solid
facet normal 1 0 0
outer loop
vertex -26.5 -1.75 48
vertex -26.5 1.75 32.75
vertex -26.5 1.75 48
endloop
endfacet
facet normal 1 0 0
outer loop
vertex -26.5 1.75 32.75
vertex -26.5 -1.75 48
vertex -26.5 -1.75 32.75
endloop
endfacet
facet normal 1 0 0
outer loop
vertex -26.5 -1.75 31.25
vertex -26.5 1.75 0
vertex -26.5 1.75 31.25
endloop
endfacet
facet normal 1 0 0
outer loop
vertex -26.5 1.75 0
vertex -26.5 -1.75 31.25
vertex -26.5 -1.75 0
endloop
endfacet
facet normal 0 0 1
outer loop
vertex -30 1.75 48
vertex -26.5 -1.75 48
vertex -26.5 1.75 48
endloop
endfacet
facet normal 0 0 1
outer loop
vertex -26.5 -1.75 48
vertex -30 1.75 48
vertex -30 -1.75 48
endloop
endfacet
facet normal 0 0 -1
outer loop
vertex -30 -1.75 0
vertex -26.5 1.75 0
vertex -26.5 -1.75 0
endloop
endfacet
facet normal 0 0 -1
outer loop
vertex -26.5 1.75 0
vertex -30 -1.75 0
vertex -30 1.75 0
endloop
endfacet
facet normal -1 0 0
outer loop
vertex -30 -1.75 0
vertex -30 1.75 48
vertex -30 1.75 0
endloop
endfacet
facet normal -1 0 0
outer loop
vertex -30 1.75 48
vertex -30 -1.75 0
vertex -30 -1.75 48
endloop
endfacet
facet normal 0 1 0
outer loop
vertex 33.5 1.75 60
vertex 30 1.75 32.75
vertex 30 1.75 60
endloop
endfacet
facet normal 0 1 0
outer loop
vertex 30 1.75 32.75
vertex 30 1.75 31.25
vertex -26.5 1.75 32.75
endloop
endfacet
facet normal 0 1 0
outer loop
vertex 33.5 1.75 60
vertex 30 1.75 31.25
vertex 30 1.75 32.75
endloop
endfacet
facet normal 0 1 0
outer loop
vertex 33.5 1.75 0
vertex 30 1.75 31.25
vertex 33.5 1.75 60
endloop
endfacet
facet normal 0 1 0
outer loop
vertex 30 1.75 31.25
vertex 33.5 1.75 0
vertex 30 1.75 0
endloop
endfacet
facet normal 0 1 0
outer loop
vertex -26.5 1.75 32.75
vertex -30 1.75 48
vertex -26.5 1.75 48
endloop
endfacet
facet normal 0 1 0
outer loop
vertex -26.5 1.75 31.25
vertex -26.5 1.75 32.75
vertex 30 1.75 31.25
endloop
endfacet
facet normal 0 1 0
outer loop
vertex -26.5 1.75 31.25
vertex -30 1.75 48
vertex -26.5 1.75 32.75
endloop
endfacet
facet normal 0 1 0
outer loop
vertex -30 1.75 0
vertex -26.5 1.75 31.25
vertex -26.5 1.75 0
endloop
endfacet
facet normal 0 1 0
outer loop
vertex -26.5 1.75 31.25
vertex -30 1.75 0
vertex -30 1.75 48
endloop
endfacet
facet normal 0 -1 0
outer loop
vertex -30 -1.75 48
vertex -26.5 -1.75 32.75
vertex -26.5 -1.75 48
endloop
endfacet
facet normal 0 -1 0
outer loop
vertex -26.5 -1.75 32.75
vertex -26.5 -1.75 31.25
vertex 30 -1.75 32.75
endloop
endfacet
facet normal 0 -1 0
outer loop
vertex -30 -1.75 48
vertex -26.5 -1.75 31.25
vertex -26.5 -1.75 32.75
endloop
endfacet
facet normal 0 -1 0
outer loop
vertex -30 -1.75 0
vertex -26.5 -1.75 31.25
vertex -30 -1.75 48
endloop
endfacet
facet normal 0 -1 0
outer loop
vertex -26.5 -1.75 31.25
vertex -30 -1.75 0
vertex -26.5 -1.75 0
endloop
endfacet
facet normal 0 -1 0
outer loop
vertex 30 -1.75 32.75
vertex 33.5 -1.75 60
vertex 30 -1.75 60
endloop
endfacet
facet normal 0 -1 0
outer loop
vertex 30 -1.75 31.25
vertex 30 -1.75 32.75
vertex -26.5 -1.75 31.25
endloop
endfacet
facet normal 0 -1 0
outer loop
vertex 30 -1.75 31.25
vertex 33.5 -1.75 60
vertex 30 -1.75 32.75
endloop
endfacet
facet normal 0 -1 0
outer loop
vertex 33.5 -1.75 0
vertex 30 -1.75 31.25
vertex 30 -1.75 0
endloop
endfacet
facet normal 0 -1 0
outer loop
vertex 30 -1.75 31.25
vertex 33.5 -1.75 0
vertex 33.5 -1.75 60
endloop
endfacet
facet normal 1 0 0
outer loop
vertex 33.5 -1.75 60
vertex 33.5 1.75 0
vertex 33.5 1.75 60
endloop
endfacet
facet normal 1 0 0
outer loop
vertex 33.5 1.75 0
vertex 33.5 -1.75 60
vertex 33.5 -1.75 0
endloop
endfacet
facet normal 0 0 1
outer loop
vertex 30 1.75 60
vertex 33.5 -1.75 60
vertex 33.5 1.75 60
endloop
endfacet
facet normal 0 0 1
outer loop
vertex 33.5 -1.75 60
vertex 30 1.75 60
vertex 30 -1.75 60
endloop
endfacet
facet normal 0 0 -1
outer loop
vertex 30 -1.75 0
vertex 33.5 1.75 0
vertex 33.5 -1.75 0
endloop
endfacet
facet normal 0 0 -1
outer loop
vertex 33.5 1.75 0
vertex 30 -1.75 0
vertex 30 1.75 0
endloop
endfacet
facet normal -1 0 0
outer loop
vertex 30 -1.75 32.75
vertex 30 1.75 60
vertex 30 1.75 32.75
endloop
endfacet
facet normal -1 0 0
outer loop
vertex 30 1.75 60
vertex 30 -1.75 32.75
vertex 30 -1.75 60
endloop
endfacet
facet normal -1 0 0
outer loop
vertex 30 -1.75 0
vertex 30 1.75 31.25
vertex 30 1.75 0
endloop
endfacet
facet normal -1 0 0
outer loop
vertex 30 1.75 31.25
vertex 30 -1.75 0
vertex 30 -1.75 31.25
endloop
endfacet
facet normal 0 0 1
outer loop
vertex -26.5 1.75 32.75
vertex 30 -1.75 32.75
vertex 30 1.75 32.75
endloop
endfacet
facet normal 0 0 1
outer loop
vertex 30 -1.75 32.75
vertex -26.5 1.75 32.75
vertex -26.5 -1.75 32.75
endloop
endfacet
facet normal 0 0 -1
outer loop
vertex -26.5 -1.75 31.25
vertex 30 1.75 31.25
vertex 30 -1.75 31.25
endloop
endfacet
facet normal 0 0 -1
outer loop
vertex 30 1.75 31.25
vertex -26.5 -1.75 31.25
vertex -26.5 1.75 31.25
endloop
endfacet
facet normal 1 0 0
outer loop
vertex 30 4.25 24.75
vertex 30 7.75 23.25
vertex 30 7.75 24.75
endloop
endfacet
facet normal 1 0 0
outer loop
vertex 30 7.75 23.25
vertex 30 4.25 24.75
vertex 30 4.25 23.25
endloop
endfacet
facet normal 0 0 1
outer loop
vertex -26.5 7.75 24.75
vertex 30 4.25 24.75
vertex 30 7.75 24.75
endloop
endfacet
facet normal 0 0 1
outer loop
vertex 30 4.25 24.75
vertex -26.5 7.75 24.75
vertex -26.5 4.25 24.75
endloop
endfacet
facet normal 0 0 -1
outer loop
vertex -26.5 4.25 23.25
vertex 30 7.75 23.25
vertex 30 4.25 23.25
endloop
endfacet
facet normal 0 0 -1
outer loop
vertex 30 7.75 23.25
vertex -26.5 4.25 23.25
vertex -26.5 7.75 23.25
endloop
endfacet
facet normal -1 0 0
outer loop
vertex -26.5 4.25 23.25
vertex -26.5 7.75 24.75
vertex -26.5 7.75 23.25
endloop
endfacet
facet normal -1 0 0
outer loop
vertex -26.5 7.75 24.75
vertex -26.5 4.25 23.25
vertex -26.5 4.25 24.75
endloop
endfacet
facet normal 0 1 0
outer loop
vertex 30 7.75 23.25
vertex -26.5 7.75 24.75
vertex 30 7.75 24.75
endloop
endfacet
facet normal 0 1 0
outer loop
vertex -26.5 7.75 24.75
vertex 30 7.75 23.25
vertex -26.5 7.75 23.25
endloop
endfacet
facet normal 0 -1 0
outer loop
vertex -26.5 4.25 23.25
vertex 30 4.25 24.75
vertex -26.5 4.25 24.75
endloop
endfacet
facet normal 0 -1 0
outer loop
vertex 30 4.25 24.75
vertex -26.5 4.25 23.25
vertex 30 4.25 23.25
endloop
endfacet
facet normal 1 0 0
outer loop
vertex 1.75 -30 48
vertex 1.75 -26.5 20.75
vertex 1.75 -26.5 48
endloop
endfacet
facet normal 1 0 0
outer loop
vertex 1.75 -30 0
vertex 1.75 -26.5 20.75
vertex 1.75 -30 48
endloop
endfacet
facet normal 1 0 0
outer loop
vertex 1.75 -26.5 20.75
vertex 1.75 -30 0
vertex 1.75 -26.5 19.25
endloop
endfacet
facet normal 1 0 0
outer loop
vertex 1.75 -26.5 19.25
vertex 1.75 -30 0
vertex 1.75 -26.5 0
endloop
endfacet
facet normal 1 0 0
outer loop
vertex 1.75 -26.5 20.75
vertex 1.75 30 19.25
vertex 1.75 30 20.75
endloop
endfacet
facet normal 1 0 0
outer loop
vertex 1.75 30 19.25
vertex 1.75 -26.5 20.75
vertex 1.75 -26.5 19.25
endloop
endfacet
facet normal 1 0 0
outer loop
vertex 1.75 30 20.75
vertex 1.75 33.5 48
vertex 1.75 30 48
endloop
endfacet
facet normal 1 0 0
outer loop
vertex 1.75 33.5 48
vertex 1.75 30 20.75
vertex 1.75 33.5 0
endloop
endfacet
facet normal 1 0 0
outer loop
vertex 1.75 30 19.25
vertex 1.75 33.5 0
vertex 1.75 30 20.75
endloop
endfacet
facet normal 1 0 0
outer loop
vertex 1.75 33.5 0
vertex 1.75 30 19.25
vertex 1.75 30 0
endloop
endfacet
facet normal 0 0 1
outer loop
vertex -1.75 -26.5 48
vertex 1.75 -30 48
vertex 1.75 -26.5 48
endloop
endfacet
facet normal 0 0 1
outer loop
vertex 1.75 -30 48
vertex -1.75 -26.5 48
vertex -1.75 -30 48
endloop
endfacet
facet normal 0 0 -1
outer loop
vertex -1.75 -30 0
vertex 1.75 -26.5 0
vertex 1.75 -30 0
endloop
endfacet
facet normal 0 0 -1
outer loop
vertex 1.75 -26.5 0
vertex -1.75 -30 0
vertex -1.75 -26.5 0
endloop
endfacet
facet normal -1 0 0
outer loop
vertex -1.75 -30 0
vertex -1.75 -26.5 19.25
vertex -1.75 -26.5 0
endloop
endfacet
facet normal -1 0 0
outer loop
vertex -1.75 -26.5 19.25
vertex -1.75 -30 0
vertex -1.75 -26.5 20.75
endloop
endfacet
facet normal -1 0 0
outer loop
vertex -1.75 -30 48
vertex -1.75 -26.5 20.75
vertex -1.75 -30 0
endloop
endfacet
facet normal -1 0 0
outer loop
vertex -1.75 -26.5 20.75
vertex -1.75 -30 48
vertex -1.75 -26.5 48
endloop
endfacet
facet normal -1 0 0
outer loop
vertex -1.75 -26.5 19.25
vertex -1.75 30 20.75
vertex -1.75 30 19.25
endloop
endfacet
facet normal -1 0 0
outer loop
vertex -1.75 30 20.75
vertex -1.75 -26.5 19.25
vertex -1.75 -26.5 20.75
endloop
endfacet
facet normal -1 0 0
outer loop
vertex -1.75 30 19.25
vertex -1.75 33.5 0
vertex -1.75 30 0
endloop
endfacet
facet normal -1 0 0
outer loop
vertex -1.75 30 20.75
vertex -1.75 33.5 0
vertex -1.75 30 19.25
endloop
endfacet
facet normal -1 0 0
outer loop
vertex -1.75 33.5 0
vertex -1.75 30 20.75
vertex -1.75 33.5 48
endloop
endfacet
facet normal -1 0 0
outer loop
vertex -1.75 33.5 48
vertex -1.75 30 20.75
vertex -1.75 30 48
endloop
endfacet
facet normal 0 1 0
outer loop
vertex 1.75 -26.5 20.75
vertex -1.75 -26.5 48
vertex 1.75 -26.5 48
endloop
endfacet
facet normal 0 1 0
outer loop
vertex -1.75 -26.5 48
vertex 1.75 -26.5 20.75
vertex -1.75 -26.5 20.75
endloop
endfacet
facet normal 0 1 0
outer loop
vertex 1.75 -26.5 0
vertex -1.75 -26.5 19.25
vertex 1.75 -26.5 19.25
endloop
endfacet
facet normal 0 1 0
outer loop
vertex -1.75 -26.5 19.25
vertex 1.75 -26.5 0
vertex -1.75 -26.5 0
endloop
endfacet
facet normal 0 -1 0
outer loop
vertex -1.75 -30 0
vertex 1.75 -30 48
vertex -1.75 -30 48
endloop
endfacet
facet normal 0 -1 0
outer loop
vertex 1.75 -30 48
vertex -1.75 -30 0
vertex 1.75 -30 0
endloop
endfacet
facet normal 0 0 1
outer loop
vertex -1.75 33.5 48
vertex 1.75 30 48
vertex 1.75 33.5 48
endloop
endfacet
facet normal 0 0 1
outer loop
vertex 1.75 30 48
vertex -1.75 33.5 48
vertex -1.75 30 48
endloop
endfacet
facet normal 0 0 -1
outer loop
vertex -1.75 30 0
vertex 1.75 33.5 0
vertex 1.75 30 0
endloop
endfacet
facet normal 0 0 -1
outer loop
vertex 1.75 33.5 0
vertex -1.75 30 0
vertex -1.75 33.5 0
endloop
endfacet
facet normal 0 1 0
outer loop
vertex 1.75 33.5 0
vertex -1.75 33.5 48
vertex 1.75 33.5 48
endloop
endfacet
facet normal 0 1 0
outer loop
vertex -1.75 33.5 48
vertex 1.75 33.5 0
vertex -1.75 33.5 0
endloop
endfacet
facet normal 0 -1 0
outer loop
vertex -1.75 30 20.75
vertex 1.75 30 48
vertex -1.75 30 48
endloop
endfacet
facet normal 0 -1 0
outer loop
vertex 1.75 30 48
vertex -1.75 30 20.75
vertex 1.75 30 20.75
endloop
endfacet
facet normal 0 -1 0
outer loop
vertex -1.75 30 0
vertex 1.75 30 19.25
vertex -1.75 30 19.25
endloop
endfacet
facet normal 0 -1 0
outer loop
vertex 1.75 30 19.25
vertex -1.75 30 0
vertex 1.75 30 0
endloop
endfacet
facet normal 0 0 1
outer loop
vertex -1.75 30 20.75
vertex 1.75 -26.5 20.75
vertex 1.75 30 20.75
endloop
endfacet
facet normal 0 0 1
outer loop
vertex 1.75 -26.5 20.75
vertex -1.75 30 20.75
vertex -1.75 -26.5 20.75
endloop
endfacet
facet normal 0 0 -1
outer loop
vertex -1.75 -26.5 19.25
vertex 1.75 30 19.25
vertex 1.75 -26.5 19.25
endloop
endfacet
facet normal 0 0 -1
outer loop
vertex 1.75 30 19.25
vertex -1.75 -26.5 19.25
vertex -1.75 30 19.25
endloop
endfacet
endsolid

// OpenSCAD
/*
  Parametric lumber assembly
  Units: inches

  Supports and rails are represented as data records.
  Rendering is separate from geometry definition.

  Actual lumber dimensions:
    2x4 = 1.5 x 3.5
    4x4 = 3.5 x 3.5

  Lumber record format:
    [
      name,      // string, e.g. "left_post"
      type,      // "2x4", "4x4"
      axis,      // "x", "y", or "z"
      start,     // [x, y, z] minimum corner
      length,    // length along axis
      rotated    // bool; rotates cross-section 90 degrees
    ]

  Default orientation:
    X-running 2x4 -> [length, 3.5, 1.5]
    Y-running 2x4 -> [3.5, length, 1.5]
    Z-running 2x4 -> [3.5, 1.5, length]

  Set rotated = false to use the alternate orientation:
    X-running 2x4 -> [length, 1.5, 3.5]
    Y-running 2x4 -> [1.5, length, 3.5]
    Z-running 2x4 -> [1.5, 3.5, length]

  BOM output:
    Call bom_lumber(piece) or bom_lumber_list(pieces).
    Output appears in the OpenSCAD console as ECHO lines.
*/

$fn = 48;


// ------------------------------------------------------------
// Vector helpers
// ------------------------------------------------------------

function v_add(a, b) =
    [a[0] + b[0], a[1] + b[1], a[2] + b[2]];

function v_mid(a, b) =
    [(a[0] + b[0]) / 2, (a[1] + b[1]) / 2, (a[2] + b[2]) / 2];

function v_replace(v, i, value) =
    [
        i == 0 ? value : v[0],
        i == 1 ? value : v[1],
        i == 2 ? value : v[2]
    ];


// ------------------------------------------------------------
// Axis helpers
// ------------------------------------------------------------

function axis_index(axis) =
    axis == "x" ? 0 :
    axis == "y" ? 1 :
    axis == "z" ? 2 :
    undef;

function axis_name(i) =
    i == 0 ? "x" :
    i == 1 ? "y" :
    i == 2 ? "z" :
    undef;

function axis_replace(v, axis, value) =
    v_replace(v, axis_index(axis), value);

function axis_coord(v, axis) =
    v[axis_index(axis)];

function other_axis(axis_a, axis_b) =
    let(
        ai = axis_index(axis_a),
        bi = axis_index(axis_b)
    )
    ai != 0 && bi != 0 ? "x" :
    ai != 1 && bi != 1 ? "y" :
    "z";


// ------------------------------------------------------------
// Lumber data model
// ------------------------------------------------------------

function lumber(
    name,
    type,
    axis,
    start,
    length,
    rotated = true
) =
    [
        name,
        type,
        axis,
        start,
        length,
        rotated
    ];

function l_name(l) =
    l[0];

function l_type(l) =
    l[1];

function l_axis(l) =
    l[2];

function l_start(l) =
    l[3];

function l_len(l) =
    l[4];

function l_rotated(l) =
    len(l) > 5 ? l[5] : true;


// ------------------------------------------------------------
// Lumber dimensions
// ------------------------------------------------------------

function l_dims(type) =
    type == "2x4" ? [1.5, 3.5] :
    type == "4x4" ? [3.5, 3.5] :
    [1, 1];

function l_size(l) =
    l_axis(l) == "x" ?
        [
            l_len(l),
            l_rotated(l) ? l_dims(l_type(l))[1] : l_dims(l_type(l))[0],
            l_rotated(l) ? l_dims(l_type(l))[0] : l_dims(l_type(l))[1]
        ] :

    l_axis(l) == "y" ?
        [
            l_rotated(l) ? l_dims(l_type(l))[1] : l_dims(l_type(l))[0],
            l_len(l),
            l_rotated(l) ? l_dims(l_type(l))[0] : l_dims(l_type(l))[1]
        ] :

    l_axis(l) == "z" ?
        [
            l_rotated(l) ? l_dims(l_type(l))[1] : l_dims(l_type(l))[0],
            l_rotated(l) ? l_dims(l_type(l))[0] : l_dims(l_type(l))[1],
            l_len(l)
        ] :

    [1, 1, 1];


// ------------------------------------------------------------
// Bounding box helpers
// ------------------------------------------------------------

function l_min(l) =
    l_start(l);

function l_max(l) =
    v_add(l_start(l), l_size(l));

function l_center(l) =
    v_mid(l_min(l), l_max(l));

function min_on_axis(l, axis) =
    l_min(l)[axis_index(axis)];

function max_on_axis(l, axis) =
    l_max(l)[axis_index(axis)];

function center_on_axis(l, axis) =
    l_center(l)[axis_index(axis)];

function size_on_axis(l, axis) =
    l_size(l)[axis_index(axis)];


// ------------------------------------------------------------
// Derived lumber: generalized rail/member between two references
// ------------------------------------------------------------

/*
  Creates a member between the inside faces of two support/reference pieces.

  Parameters:
    name:
      Name of the generated member for BOM output.

    type:
      Lumber type, e.g. "2x4".

    support_a, support_b:
      Lumber records used as references.

    span_axis:
      Axis along which the new member runs: "x", "y", or "z".

    position_axis:
      Axis on which the single position parameter is applied.

    position:
      Center coordinate of the new member on position_axis.

    cross_offset:
      Offset from the aligned support center on the remaining cross-section axis.
      The remaining axis is automatically determined from:
        span_axis + position_axis.

    inset:
      Offset inward from the reference faces.
      Positive inset shortens the member.

    rotated:
      Cross-section orientation.
      Defaults to true:
        wide dimension on cross_axis,
        narrow dimension on position_axis.

  Example:
    lumber_between(
      "front_rail",
      "2x4",
      left_post,
      right_post,
      span_axis = "x",
      position_axis = "z",
      position = 32,
      cross_offset = 0
    );
*/
function lumber_between(
    name,
    type,
    support_a,
    support_b,
    span_axis,
    position_axis,
    position,
    cross_offset = 0,
    inset = 0,
    rotated = true
) =
    let(
        d = l_dims(type),

        cross_axis = other_axis(span_axis, position_axis),

        cross_dim = rotated ? d[1] : d[0],
        pos_dim   = rotated ? d[0] : d[1],

        a_min = min_on_axis(support_a, span_axis),
        a_max = max_on_axis(support_a, span_axis),
        b_min = min_on_axis(support_b, span_axis),
        b_max = max_on_axis(support_b, span_axis),

        a_before_b = a_min < b_min,

        start_face = a_before_b ? a_max : b_max,
        end_face   = a_before_b ? b_min : a_min,

        start_span = start_face + inset,
        end_span   = end_face - inset,

        member_len = end_span - start_span,

        cross_min = max(
            min_on_axis(support_a, cross_axis),
            min_on_axis(support_b, cross_axis)
        ),
        cross_max = min(
            max_on_axis(support_a, cross_axis),
            max_on_axis(support_b, cross_axis)
        ),
        cross_center = (cross_min + cross_max) / 2,

        start0 = [0, 0, 0],
        start1 = axis_replace(start0, span_axis, start_span),
        start2 = axis_replace(start1, cross_axis, cross_center + cross_offset - cross_dim / 2),
        start3 = axis_replace(start2, position_axis, position - pos_dim / 2)
    )
    lumber(
        name,
        type,
        span_axis,
        start3,
        member_len,
        rotated
    );


// ------------------------------------------------------------
// Derived lumber: generalized auto-position helper
// ------------------------------------------------------------

/*
  Creates a member between two references and automatically centers it
  on position_axis within the overlapping range of both supports.

  This replaces the older lumber_between_x_auto_z style.
*/
function lumber_between_auto_position(
    name,
    type,
    support_a,
    support_b,
    span_axis,
    position_axis,
    cross_offset = 0,
    inset = 0,
    rotated = true
) =
    let(
        p1 = max(
            min_on_axis(support_a, position_axis),
            min_on_axis(support_b, position_axis)
        ),

        p2 = min(
            max_on_axis(support_a, position_axis),
            max_on_axis(support_b, position_axis)
        ),

        p_center = (p1 + p2) / 2
    )
    lumber_between(
        name,
        type,
        support_a,
        support_b,
        span_axis = span_axis,
        position_axis = position_axis,
        position = p_center,
        cross_offset = cross_offset,
        inset = inset,
        rotated = rotated
    );


// ------------------------------------------------------------
// Rendering
// ------------------------------------------------------------

module render_lumber(l) {
    translate(l_start(l))
        cube(l_size(l));
}

module render_lumber_list(pieces) {
    for (piece = pieces)
        render_lumber(piece);
}


// ------------------------------------------------------------
// BOM output
// ------------------------------------------------------------

module bom_lumber(l) {
    echo(
        str(
            "BOM | name: ", l_name(l),
            " | type: ", l_type(l),
            " | length: ", l_len(l), " in",
            " | axis: ", l_axis(l)
        )
    );
}

module bom_lumber_list(pieces) {
    echo("BOM | ---- lumber members ----");

    for (piece = pieces)
        bom_lumber(piece);

    echo("BOM | ------------------------");
}


// ------------------------------------------------------------
// Optional combined render + BOM output
// ------------------------------------------------------------

module render_lumber_with_bom(l) {
    bom_lumber(l);
    render_lumber(l);
}

module render_lumber_list_with_bom(pieces) {
    bom_lumber_list(pieces);
    render_lumber_list(pieces);
}


// ------------------------------------------------------------
// Example assembly
// ------------------------------------------------------------

// Two fixed supports.
left_post = lumber(
    "left_post",
    "4x4",
    "z",
    [-30, -1.75, 0],
    48
);

right_post = lumber(
    "right_post",
    "4x4",
    "z",
    [30, -1.75, 0],
    60
);

// A 2x4 automatically spanning between the inside faces.
//
// span_axis = "x":
//   The rail runs left-to-right.
//
// position_axis = "z":
//   position = 32 means the rail is centered at Z = 32.
//
// cross_offset = 0:
//   The rail is centered on the support overlap along Y.
//
// rotated defaults to true:
//   X-running 2x4 size is [length, 3.5, 1.5].
front_rail = lumber_between(
    "front_rail",
    "2x4",
    left_post,
    right_post,
    span_axis = "x",
    position_axis = "z",
    position = 32,
    cross_offset = 0
);


// Same idea, but auto-positioned on the overlapping Z range
// of the two posts.
rear_rail_auto_z = lumber_between_auto_position(
    "rear_rail_auto_z",
    "2x4",
    left_post,
    right_post,
    span_axis = "x",
    position_axis = "z",
    cross_offset = 6
);


// Example of a Y-axis span using the same generalized function.
near_post = lumber(
    "near_post",
    "4x4",
    "z",
    [-1.75, -30, 0],
    48
);

far_post = lumber(
    "far_post",
    "4x4",
    "z",
    [-1.75, 30, 0],
    48
);

side_rail = lumber_between(
    "side_rail",
    "2x4",
    near_post,
    far_post,
    span_axis = "y",
    position_axis = "z",
    position = 20,
    cross_offset = 0
);


// Collect pieces into a single assembly list.
assembly = [
    left_post,
    right_post,
    front_rail,
    rear_rail_auto_z,

    near_post,
    far_post,
    side_rail
];


// ------------------------------------------------------------
// Render scene and output BOM
// ------------------------------------------------------------

render_lumber_list_with_bom(assembly);
